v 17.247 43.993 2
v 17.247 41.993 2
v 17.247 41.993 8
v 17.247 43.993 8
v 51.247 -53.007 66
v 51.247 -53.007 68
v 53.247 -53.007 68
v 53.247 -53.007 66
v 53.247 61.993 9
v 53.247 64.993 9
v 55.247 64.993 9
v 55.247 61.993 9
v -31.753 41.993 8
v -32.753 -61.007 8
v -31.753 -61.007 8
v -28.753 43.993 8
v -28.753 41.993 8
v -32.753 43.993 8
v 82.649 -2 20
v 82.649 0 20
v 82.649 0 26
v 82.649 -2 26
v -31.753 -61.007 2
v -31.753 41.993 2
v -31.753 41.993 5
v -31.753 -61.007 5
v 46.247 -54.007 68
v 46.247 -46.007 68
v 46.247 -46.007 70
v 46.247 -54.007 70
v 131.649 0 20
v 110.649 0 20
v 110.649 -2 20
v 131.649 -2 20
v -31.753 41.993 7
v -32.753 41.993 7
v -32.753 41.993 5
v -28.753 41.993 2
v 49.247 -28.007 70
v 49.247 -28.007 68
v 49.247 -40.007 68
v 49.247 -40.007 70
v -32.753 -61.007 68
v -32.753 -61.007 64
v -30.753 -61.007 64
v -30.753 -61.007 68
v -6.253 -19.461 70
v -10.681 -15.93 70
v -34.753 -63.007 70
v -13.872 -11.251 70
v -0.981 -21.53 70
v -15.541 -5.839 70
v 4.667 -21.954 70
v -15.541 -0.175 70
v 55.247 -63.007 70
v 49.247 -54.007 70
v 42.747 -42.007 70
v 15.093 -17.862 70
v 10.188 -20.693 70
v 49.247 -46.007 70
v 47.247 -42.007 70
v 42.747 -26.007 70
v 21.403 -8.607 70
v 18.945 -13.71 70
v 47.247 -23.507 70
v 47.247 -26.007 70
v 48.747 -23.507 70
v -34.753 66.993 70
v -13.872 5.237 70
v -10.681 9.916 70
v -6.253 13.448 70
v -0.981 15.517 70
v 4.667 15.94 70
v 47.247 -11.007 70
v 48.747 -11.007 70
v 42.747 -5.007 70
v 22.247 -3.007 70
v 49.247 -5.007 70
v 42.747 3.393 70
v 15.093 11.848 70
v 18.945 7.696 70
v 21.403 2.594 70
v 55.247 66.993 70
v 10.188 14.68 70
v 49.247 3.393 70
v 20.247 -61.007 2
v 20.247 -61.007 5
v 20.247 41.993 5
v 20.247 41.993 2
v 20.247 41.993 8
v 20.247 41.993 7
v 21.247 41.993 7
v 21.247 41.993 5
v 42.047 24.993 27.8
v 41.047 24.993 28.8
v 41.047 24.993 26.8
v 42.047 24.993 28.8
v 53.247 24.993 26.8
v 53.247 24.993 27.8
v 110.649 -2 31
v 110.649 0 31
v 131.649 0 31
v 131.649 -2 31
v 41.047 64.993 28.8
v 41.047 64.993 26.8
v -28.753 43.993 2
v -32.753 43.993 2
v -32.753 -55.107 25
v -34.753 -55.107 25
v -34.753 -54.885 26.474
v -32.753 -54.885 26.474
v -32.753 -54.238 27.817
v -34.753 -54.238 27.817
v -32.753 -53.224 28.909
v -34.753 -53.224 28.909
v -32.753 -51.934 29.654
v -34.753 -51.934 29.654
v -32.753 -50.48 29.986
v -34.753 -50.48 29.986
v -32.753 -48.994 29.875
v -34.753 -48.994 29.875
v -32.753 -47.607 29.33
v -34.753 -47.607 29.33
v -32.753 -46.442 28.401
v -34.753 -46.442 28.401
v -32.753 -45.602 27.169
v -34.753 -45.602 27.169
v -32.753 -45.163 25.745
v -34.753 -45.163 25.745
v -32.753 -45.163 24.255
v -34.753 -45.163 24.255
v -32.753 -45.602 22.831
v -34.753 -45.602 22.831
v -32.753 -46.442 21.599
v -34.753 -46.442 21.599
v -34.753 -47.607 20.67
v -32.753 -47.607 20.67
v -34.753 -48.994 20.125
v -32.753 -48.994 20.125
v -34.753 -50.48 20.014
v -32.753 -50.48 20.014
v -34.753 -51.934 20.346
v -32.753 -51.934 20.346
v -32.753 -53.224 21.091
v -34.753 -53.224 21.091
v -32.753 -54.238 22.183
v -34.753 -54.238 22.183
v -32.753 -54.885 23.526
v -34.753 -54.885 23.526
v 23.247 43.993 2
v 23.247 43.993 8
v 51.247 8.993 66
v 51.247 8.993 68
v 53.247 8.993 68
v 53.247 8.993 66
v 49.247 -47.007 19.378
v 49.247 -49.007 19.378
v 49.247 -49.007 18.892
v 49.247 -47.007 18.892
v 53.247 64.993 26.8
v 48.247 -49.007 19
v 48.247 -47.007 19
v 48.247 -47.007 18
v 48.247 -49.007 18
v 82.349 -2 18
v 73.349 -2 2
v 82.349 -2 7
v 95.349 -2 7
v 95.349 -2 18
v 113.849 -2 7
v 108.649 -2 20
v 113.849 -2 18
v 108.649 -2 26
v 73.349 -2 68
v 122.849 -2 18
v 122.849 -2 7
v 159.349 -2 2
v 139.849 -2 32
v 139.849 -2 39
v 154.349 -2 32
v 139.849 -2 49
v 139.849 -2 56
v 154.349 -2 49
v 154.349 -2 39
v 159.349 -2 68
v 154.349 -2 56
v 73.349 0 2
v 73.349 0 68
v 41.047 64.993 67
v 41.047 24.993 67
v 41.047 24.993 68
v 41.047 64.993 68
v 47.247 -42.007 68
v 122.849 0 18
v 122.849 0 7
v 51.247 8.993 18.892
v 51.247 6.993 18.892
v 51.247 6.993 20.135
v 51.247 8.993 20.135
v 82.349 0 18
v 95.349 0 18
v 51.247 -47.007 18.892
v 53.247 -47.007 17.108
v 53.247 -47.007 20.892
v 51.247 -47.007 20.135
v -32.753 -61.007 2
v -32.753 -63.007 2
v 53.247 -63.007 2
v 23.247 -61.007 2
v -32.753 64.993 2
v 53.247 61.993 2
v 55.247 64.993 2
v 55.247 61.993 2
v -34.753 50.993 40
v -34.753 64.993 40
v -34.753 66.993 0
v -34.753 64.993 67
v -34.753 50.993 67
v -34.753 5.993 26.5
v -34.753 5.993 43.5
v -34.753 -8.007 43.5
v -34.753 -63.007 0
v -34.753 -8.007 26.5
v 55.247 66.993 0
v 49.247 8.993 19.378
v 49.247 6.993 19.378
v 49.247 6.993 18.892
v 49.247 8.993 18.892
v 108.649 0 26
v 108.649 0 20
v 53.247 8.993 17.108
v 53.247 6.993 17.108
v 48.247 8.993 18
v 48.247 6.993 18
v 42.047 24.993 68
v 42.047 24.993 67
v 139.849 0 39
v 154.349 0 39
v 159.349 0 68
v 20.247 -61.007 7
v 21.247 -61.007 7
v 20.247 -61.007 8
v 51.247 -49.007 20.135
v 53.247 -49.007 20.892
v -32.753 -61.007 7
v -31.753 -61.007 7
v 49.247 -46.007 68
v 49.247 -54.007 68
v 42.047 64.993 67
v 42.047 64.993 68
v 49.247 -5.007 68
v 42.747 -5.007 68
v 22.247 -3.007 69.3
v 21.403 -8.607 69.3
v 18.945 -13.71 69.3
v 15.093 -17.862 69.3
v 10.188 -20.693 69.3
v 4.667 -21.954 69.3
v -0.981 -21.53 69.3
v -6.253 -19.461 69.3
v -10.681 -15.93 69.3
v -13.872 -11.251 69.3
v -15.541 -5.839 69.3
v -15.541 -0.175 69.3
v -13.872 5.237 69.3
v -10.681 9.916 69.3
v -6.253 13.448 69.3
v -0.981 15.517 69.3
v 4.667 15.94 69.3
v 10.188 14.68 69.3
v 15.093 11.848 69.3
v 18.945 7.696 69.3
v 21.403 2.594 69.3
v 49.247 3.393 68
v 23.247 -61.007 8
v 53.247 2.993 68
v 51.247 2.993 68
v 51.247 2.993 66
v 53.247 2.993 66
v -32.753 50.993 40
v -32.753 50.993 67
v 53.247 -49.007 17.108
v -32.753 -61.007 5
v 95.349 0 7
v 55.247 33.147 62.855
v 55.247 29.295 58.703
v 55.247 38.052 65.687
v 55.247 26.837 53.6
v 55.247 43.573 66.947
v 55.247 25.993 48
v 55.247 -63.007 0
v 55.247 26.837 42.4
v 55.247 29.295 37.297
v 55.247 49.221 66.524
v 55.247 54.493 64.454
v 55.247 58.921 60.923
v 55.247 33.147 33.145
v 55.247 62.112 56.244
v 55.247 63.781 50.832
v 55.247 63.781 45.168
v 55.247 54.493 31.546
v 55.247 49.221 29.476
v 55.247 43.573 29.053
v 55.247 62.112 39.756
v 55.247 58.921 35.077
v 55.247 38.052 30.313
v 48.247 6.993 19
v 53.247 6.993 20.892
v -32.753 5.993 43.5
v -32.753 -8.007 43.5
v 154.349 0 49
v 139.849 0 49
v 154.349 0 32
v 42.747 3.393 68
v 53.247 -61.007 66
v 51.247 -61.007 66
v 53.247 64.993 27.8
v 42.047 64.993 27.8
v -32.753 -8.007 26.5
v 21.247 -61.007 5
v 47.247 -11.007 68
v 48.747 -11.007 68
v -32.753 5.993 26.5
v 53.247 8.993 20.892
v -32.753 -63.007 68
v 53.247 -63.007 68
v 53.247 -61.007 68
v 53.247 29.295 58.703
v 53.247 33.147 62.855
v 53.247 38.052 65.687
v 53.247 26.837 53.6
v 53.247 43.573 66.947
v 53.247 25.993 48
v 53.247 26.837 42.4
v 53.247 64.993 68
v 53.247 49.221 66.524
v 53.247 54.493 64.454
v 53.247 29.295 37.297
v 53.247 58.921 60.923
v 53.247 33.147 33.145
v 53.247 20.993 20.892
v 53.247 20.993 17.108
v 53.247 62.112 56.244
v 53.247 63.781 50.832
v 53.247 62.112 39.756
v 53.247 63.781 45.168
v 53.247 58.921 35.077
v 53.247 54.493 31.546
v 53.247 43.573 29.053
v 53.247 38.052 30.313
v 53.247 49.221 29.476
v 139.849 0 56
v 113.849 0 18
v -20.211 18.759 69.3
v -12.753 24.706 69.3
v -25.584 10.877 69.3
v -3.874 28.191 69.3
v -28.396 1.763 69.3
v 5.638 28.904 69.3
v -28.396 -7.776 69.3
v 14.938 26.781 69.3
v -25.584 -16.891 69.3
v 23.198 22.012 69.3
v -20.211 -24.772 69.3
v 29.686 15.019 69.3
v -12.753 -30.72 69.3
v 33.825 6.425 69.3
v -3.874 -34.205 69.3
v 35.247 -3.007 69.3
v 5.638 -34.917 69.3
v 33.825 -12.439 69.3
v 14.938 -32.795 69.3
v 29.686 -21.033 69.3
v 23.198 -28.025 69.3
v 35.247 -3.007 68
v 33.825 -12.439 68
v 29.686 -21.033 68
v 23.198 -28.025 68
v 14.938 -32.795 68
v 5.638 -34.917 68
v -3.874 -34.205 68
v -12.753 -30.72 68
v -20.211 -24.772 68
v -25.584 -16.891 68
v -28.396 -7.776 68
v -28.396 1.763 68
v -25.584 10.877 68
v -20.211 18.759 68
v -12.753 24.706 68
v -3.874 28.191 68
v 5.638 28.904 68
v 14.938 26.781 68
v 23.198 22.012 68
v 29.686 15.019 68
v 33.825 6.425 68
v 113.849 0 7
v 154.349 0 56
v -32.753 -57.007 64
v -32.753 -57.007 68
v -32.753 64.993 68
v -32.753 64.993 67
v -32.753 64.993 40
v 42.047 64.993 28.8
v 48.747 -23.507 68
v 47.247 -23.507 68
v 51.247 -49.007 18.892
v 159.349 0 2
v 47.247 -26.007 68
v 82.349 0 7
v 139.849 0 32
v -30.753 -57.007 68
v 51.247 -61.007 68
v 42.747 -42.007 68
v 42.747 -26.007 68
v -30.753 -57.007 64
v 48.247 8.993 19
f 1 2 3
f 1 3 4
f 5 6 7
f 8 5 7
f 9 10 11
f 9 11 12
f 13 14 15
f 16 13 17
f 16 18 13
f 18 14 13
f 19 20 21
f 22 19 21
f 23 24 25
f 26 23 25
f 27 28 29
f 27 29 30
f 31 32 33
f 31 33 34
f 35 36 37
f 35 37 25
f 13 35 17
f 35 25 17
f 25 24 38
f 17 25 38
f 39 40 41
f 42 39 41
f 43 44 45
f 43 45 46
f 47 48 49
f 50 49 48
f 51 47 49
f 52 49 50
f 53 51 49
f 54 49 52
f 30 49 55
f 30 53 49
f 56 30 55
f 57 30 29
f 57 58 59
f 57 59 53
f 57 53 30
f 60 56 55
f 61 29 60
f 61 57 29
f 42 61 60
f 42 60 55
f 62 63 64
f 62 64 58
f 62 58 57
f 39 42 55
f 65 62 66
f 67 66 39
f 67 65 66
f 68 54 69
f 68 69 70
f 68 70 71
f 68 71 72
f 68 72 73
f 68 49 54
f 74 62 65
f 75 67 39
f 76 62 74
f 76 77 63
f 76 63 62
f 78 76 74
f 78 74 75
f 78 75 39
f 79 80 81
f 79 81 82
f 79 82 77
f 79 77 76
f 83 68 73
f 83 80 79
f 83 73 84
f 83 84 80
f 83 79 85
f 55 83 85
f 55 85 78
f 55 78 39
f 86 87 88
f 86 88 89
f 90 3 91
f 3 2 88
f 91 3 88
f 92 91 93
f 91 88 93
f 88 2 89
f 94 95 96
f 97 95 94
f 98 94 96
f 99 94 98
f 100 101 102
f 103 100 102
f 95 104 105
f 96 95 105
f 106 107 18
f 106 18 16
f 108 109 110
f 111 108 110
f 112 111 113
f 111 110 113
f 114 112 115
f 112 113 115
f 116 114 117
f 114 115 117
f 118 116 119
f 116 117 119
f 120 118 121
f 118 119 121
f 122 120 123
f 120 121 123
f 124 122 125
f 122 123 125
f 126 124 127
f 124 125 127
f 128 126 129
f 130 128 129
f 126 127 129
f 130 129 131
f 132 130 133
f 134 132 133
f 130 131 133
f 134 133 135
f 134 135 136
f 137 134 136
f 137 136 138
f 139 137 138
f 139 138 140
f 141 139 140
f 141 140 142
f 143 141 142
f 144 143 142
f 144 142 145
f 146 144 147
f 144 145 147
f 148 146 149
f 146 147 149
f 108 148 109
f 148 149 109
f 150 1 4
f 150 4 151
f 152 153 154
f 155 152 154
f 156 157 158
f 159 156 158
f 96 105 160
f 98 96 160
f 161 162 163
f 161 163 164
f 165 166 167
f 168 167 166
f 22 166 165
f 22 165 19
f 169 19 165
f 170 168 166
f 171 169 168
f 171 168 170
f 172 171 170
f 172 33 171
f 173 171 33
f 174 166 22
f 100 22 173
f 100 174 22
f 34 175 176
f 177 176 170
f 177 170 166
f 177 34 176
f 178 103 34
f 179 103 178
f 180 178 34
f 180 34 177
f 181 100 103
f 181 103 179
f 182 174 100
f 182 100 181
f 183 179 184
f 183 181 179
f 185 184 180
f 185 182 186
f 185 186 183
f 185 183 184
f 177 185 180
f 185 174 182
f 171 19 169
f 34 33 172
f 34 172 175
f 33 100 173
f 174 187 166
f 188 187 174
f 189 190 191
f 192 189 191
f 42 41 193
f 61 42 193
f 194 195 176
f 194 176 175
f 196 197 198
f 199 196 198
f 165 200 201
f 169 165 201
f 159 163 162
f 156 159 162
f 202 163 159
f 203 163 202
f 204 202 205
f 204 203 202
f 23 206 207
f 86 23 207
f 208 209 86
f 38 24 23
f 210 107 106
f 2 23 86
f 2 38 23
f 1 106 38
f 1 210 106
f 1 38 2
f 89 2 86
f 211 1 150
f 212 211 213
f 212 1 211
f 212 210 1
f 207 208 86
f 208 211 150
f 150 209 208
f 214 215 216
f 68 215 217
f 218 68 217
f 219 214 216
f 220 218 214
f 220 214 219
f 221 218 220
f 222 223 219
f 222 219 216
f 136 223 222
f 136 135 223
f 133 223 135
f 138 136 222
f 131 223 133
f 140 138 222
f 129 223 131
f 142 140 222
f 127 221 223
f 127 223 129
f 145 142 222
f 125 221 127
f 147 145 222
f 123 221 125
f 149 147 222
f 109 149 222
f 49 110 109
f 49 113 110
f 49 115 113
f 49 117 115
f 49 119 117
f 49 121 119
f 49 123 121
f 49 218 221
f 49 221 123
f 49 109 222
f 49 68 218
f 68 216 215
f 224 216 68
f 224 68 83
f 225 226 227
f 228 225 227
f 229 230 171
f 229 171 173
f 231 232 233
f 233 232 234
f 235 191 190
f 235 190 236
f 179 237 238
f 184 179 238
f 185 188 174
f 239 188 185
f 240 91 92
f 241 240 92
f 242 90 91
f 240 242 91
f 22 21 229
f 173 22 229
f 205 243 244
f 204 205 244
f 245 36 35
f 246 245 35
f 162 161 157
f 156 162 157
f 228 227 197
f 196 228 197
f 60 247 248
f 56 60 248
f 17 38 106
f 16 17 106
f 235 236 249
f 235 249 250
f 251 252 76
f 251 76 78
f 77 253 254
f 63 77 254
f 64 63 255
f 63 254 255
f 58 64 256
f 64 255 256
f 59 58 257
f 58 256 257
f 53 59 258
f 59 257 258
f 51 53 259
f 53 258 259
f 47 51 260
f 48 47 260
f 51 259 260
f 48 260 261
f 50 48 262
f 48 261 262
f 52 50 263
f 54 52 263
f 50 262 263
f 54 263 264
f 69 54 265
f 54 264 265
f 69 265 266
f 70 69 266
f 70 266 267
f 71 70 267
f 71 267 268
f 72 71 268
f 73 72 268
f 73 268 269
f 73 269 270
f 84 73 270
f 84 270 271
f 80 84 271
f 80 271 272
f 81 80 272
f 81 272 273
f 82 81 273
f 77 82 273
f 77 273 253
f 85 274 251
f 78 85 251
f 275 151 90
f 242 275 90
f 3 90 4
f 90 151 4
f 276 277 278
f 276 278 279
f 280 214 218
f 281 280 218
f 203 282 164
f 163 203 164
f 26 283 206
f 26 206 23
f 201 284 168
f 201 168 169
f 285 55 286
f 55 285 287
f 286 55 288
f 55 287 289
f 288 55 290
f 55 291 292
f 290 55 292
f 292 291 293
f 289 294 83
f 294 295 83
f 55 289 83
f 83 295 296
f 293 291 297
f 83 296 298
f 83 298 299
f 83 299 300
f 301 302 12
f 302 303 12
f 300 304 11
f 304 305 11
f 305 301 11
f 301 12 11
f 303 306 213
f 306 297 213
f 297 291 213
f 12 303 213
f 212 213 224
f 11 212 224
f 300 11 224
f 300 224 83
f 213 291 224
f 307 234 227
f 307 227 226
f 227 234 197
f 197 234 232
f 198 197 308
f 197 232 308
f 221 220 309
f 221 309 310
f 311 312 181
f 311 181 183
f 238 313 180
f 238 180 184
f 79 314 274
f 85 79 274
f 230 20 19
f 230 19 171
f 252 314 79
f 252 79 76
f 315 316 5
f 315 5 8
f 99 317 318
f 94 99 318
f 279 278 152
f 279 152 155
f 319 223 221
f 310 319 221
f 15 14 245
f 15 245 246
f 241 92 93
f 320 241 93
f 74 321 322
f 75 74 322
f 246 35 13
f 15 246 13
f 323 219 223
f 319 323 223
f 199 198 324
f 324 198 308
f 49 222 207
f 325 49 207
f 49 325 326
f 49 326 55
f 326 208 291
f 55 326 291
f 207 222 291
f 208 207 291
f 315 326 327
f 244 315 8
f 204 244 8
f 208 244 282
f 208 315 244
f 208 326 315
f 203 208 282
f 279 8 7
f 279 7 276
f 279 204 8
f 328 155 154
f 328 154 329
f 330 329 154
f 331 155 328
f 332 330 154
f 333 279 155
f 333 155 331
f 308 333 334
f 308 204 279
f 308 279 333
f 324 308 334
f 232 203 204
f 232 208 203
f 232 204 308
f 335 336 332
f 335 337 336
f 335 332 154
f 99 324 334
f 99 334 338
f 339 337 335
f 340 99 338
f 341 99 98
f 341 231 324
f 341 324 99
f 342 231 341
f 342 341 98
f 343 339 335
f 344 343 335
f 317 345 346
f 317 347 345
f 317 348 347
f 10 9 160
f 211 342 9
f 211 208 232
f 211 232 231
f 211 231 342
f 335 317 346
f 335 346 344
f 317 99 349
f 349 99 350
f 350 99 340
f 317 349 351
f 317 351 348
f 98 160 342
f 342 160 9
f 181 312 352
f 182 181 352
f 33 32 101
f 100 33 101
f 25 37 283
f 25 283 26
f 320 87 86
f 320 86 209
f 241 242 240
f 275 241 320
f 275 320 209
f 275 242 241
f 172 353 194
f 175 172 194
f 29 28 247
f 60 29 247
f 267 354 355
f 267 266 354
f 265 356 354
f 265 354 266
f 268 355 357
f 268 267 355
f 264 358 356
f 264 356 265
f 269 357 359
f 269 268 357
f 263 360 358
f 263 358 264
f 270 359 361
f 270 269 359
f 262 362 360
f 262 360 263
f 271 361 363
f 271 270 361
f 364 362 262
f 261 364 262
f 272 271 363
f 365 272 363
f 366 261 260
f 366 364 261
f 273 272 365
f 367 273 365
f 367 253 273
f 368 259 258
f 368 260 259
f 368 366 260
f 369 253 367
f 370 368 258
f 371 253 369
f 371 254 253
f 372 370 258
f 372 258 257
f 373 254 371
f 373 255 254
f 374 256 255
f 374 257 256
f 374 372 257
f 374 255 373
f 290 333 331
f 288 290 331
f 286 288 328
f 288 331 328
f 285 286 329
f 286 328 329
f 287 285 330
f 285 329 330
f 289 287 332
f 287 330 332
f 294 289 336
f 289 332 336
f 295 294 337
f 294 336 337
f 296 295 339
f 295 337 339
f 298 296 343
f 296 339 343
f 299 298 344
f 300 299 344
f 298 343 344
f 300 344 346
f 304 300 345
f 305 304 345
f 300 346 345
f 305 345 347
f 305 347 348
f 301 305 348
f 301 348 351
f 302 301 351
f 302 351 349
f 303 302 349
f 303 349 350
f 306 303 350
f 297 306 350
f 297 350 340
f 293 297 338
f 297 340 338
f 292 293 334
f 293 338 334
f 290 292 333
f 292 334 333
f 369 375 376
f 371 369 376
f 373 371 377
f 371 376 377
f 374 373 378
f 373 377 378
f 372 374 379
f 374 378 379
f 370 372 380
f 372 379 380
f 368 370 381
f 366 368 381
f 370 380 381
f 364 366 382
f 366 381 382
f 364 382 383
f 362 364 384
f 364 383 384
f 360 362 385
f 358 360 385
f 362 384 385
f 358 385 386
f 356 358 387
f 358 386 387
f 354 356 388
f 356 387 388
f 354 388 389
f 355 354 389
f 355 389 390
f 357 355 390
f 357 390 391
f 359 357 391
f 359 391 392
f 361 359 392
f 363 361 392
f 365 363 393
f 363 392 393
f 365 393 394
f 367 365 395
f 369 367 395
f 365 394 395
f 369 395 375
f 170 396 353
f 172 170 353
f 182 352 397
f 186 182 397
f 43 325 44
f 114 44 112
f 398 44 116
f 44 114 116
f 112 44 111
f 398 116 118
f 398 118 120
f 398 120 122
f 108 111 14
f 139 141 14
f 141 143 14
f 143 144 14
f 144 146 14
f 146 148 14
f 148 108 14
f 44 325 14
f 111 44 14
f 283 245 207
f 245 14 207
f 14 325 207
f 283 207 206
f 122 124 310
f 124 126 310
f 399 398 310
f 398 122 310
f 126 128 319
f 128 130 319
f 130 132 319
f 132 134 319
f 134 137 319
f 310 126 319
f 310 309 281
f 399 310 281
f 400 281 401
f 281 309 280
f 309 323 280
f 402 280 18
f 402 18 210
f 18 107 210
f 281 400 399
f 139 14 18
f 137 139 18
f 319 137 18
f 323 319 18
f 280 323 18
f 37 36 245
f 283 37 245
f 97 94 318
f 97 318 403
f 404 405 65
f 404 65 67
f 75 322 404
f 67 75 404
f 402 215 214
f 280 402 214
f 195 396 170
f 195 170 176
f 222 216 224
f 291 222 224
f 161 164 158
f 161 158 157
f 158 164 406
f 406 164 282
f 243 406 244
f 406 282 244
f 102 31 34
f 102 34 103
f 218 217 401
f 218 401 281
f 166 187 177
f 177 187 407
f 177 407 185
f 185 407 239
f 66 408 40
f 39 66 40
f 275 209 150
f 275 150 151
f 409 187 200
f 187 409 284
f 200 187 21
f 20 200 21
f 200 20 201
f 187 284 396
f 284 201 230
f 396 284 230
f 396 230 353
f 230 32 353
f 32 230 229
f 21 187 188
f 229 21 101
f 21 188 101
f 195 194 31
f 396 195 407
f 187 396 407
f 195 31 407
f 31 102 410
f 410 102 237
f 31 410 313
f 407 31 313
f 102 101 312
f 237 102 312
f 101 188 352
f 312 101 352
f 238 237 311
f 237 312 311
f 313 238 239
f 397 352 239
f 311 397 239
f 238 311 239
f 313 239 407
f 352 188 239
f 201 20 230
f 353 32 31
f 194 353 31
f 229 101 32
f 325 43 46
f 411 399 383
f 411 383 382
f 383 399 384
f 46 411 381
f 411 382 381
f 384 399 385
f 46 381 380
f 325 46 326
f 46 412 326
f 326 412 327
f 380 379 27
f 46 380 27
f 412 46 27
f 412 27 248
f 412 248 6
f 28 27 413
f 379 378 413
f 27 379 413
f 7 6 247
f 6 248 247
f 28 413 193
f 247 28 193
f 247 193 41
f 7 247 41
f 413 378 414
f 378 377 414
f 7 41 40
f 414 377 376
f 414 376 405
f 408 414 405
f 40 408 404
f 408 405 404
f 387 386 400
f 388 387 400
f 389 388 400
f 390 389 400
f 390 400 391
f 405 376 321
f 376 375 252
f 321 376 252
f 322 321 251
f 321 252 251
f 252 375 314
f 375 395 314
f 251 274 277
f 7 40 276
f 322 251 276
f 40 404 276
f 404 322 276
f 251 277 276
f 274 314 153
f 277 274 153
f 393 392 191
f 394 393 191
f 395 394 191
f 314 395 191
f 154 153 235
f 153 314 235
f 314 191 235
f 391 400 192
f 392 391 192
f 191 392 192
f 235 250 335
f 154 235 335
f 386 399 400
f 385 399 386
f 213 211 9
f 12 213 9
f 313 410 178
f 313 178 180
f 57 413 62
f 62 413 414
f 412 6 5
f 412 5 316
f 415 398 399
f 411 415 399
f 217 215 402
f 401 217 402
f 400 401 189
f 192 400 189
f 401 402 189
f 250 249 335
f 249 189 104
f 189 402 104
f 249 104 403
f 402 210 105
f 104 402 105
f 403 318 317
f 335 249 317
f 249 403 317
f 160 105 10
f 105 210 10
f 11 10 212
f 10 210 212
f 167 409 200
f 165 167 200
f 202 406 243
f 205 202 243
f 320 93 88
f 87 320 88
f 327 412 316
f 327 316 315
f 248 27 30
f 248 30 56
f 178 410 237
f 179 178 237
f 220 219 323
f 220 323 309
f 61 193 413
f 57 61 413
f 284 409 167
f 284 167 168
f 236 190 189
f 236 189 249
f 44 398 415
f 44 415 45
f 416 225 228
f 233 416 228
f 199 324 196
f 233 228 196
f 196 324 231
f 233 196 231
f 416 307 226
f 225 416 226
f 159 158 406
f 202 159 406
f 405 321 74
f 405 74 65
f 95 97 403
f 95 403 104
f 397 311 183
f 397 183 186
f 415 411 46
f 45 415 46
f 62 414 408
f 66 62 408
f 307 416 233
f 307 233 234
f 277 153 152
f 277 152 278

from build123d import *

# Parameters (mm, degrees)
F0_W      = 90
F0_H      = 130
F1_DEPTH  = 70
F2_T      = -2
F3_W      = 4
F3_H      = 2
F3_W_2    = 6
F4_DEPTH  = 6
F5_W      = 1
F5_H      = 3
F5_H_2    = 1
F6_DEPTH  = 103
F7_W      = 2
F7_H      = 3.7837837838
F8_DEPTH  = 5
F10_DEPTH = 70
F11_W     = 6.5
F11_H     = 8.4
F11_W_2   = 1.5
F11_H_2   = 12.5
F11_W_3   = 3
F11_H_3   = 8
F11_R     = 19
F12_DEPTH = 2
F11_R_2   = 32
F13_DEPTH = 1.3
F11_W_4   = 2
F11_H_4   = 6
F14_DEPTH = 2
F15_W     = 1
F15_H     = 1
F16_DEPTH = 40
F17_R     = 19
F18_DEPTH = 2
F19_W     = 86
F19_H     = 66
F19_W_2   = 13
F19_H_2   = 11
F19_W_3   = 26
F19_H_3   = 6
F19_W_4   = 9
F19_W_5   = 21
F19_W_6   = 14.5
F19_H_4   = 7
F20_DEPTH = 2
F21_W     = 3
F21_H     = 7
F22_DEPTH = 2
F23_W     = 14
F23_H     = 27
F23_H_2   = 17
F23_R     = 5
F24_DEPTH = 2
F23_W_2   = 4
F23_H_3   = 4
F25_DEPTH = 4


# Not quite as in the source:
# - a feature names something its author has since deleted; it is built from what else it names


with BuildPart() as f1:
    # F0 (on Top) → F1 (new body)
    with BuildSketch(Plane.XY):
        with Locations((10.2467668056, 1.9931593537)):
            Rectangle(F0_W, F0_H)
    extrude(amount=F1_DEPTH)

    # F2
    f2_openings = [f1.faces().sort_by_distance(p)[0] for p in [
        (10.246767, -63.006841, 35),
    ]]
    offset(amount=F2_T, openings=f2_openings)

    # F3 (on face) → F4 (join)
    with BuildSketch(Plane.XY.offset(2)):
        with Locations((-30.7532331944, 42.9931593537)):
            Rectangle(F3_W, F3_H)
        with Locations((20.2467668056, 42.9931593537)):
            Rectangle(F3_W_2, F3_H)
    extrude(amount=F4_DEPTH)

    # F5 (on face) → F6 (join)
    with BuildSketch(Plane.XZ.offset(-41.9931593537)):
        Polygon((20.2467668056, 7), (21.2467668056, 7), (21.2467668056, 5), (20.2467668056, 5), (20.2467668056, 2), (23.2467668056, 2), (23.2467668056, 8), (20.2467668056, 8), align=None)
        with Locations((-32.2532331944, 3.5)):
            Rectangle(F5_W, F5_H)
        with Locations((-32.2532331944, 7.5)):
            Rectangle(F5_W, F5_H_2)
    extrude(amount=F6_DEPTH)

    # F7 (on face) → F8 (join)
    with BuildSketch(Plane(origin=(53.2467668056, 0, 0), x_dir=(0, -1, 0), z_dir=(-1, 0, 0))):
        Polygon((-8.9931593537, 20.8918918919), (-8.9931593537, 17.1081081081), (-6.9931593537, 17.1081081081), (-6.9931593537, 19), (-6.9931593537, 20.8918918919), align=None)
        with Locations((48.0068406463, 19)):
            Rectangle(F7_W, F7_H)
    extrude(amount=F8_DEPTH)

    # F9 (on face) → F10 (cut)
    with BuildSketch(Plane.XZ.offset(49.0068406463)):
        Polygon((51.2467668056, 20.1351351351), (53.2467668056, 20.8918918919), (48.2467668056, 20.8918918919), (48.2467668056, 19), (49.2467668056, 19.3783783784), (49.2467668056, 18.8918918919), (51.2467668056, 18.8918918919), align=None)
        Polygon((48.2467668056, 17.1081081081), (53.2467668056, 17.1081081081), (48.2467668056, 18), align=None)
    extrude(amount=-F10_DEPTH, mode=Mode.SUBTRACT)

    # F11 (on face) → F12 (cut)
    with BuildSketch(Plane(origin=(0, 0, 68), x_dir=(1, 0, 0), z_dir=(0, 0, -1))):
        with Locations((45.9967668056, 0.8068406463)):
            Rectangle(F11_W, F11_H)
        with Locations((47.9967668056, 17.2568406463)):
            Rectangle(F11_W_2, F11_H_2)
        Polygon((49.2467668056, 28.0068406463), (49.2467668056, 40.0068406463), (47.2467668056, 42.0068406463), (42.7467668056, 42.0068406463), (42.7467668056, 26.0068406463), (47.2467668056, 26.0068406463), align=None)
        with Locations((47.7467668056, 50.0068406463)):
            Rectangle(F11_W_3, F11_H_3)
        with Locations((3.2467668056, 3.0068406463)):
            Circle(F11_R)
    extrude(amount=-F12_DEPTH, mode=Mode.SUBTRACT)

    # F11 (on face) → F13 (cut)
    with BuildSketch(Plane(origin=(0, 0, 68), x_dir=(1, 0, 0), z_dir=(0, 0, -1))):
        with Locations((3.2467668056, 3.0068406463)):
            Circle(F11_R_2)
        with Locations((3.2467668056, 3.0068406463)):
            Circle(F11_R, mode=Mode.SUBTRACT)
    extrude(amount=-F13_DEPTH, mode=Mode.SUBTRACT)

    # F11 (on face) → F14 (join)
    with BuildSketch(Plane(origin=(0, 0, 68), x_dir=(1, 0, 0), z_dir=(0, 0, -1))):
        with Locations((52.2467668056, -5.9931593537)):
            Rectangle(F11_W_4, F11_H_4)
        with Locations((52.2467668056, 57.0068406463)):
            Rectangle(F11_W_4, F11_H_3)
    extrude(amount=F14_DEPTH)

    # F15 (on face) → F16 (join)
    with BuildSketch(Plane.XZ.offset(-64.9931593537)):
        Polygon((53.2467668056, 26.8), (53.2467668056, 27.8), (42.0467668056, 27.8), (42.0467668056, 28.8), (41.0467668056, 28.8), (41.0467668056, 26.8), align=None)
        with Locations((41.5467668056, 67.5)):
            Rectangle(F15_W, F15_H)
    extrude(amount=F16_DEPTH)

    # F17 (on face) → F18 (cut)
    with BuildSketch(Plane(origin=(53.2467668056, 0, 0), x_dir=(0, -1, 0), z_dir=(-1, 0, 0))):
        with Locations((-44.9931593537, 48)):
            Circle(F17_R)
    extrude(amount=-F18_DEPTH, mode=Mode.SUBTRACT)

    # F21 (on face) → F22 (cut)
    with BuildSketch(Plane(origin=(53.2467668056, 0, 0), x_dir=(0, -1, 0), z_dir=(-1, 0, 0))):
        with Locations((-63.4931593537, 5.5)):
            Rectangle(F21_W, F21_H)
    extrude(amount=-F22_DEPTH, mode=Mode.SUBTRACT)

    # F23 (on face) → F24 (cut)
    with BuildSketch(Plane(origin=(-34.7532331944, 0, 0), x_dir=(0, -1, 0), z_dir=(-1, 0, 0))):
        with Locations((-57.9931593537, 53.5)):
            Rectangle(F23_W, F23_H)
        with Locations((1.0068406463, 35)):
            Rectangle(F23_W, F23_H_2)
        with Locations((50.1068407744, 25)):
            Circle(F23_R)
    extrude(amount=-F24_DEPTH, mode=Mode.SUBTRACT)

    # F23 (on face) → F25 (join)
    with BuildSketch(Plane(origin=(-34.7532331944, 0, 0), x_dir=(0, -1, 0), z_dir=(-1, 0, 0))):
        with Locations((59.0068406463, 66)):
            Rectangle(F23_W_2, F23_H_3)
    extrude(amount=-F25_DEPTH)


with BuildPart() as f20:
    # F19 (on Front) → F20 (new body)
    with BuildSketch(Plane.XZ):
        with Locations((116.3490213752, 35)):
            Rectangle(F19_W, F19_H)
        with Locations((88.8490213752, 12.5)):
            Rectangle(F19_W_2, F19_H_2, mode=Mode.SUBTRACT)
        with Locations((95.6490213752, 23)):
            Rectangle(F19_W_3, F19_H_3, mode=Mode.SUBTRACT)
        with Locations((118.3490213752, 12.5)):
            Rectangle(F19_W_4, F19_H_2, mode=Mode.SUBTRACT)
        with Locations((121.1490213752, 25.5)):
            Rectangle(F19_W_5, F19_H_2, mode=Mode.SUBTRACT)
        with Locations((147.0990213752, 35.5)):
            Rectangle(F19_W_6, F19_H_4, mode=Mode.SUBTRACT)
        with Locations((147.0990213752, 52.5)):
            Rectangle(F19_W_6, F19_H_4, mode=Mode.SUBTRACT)
    extrude(amount=F20_DEPTH)


solid = Compound([f1.part, f20.part])
